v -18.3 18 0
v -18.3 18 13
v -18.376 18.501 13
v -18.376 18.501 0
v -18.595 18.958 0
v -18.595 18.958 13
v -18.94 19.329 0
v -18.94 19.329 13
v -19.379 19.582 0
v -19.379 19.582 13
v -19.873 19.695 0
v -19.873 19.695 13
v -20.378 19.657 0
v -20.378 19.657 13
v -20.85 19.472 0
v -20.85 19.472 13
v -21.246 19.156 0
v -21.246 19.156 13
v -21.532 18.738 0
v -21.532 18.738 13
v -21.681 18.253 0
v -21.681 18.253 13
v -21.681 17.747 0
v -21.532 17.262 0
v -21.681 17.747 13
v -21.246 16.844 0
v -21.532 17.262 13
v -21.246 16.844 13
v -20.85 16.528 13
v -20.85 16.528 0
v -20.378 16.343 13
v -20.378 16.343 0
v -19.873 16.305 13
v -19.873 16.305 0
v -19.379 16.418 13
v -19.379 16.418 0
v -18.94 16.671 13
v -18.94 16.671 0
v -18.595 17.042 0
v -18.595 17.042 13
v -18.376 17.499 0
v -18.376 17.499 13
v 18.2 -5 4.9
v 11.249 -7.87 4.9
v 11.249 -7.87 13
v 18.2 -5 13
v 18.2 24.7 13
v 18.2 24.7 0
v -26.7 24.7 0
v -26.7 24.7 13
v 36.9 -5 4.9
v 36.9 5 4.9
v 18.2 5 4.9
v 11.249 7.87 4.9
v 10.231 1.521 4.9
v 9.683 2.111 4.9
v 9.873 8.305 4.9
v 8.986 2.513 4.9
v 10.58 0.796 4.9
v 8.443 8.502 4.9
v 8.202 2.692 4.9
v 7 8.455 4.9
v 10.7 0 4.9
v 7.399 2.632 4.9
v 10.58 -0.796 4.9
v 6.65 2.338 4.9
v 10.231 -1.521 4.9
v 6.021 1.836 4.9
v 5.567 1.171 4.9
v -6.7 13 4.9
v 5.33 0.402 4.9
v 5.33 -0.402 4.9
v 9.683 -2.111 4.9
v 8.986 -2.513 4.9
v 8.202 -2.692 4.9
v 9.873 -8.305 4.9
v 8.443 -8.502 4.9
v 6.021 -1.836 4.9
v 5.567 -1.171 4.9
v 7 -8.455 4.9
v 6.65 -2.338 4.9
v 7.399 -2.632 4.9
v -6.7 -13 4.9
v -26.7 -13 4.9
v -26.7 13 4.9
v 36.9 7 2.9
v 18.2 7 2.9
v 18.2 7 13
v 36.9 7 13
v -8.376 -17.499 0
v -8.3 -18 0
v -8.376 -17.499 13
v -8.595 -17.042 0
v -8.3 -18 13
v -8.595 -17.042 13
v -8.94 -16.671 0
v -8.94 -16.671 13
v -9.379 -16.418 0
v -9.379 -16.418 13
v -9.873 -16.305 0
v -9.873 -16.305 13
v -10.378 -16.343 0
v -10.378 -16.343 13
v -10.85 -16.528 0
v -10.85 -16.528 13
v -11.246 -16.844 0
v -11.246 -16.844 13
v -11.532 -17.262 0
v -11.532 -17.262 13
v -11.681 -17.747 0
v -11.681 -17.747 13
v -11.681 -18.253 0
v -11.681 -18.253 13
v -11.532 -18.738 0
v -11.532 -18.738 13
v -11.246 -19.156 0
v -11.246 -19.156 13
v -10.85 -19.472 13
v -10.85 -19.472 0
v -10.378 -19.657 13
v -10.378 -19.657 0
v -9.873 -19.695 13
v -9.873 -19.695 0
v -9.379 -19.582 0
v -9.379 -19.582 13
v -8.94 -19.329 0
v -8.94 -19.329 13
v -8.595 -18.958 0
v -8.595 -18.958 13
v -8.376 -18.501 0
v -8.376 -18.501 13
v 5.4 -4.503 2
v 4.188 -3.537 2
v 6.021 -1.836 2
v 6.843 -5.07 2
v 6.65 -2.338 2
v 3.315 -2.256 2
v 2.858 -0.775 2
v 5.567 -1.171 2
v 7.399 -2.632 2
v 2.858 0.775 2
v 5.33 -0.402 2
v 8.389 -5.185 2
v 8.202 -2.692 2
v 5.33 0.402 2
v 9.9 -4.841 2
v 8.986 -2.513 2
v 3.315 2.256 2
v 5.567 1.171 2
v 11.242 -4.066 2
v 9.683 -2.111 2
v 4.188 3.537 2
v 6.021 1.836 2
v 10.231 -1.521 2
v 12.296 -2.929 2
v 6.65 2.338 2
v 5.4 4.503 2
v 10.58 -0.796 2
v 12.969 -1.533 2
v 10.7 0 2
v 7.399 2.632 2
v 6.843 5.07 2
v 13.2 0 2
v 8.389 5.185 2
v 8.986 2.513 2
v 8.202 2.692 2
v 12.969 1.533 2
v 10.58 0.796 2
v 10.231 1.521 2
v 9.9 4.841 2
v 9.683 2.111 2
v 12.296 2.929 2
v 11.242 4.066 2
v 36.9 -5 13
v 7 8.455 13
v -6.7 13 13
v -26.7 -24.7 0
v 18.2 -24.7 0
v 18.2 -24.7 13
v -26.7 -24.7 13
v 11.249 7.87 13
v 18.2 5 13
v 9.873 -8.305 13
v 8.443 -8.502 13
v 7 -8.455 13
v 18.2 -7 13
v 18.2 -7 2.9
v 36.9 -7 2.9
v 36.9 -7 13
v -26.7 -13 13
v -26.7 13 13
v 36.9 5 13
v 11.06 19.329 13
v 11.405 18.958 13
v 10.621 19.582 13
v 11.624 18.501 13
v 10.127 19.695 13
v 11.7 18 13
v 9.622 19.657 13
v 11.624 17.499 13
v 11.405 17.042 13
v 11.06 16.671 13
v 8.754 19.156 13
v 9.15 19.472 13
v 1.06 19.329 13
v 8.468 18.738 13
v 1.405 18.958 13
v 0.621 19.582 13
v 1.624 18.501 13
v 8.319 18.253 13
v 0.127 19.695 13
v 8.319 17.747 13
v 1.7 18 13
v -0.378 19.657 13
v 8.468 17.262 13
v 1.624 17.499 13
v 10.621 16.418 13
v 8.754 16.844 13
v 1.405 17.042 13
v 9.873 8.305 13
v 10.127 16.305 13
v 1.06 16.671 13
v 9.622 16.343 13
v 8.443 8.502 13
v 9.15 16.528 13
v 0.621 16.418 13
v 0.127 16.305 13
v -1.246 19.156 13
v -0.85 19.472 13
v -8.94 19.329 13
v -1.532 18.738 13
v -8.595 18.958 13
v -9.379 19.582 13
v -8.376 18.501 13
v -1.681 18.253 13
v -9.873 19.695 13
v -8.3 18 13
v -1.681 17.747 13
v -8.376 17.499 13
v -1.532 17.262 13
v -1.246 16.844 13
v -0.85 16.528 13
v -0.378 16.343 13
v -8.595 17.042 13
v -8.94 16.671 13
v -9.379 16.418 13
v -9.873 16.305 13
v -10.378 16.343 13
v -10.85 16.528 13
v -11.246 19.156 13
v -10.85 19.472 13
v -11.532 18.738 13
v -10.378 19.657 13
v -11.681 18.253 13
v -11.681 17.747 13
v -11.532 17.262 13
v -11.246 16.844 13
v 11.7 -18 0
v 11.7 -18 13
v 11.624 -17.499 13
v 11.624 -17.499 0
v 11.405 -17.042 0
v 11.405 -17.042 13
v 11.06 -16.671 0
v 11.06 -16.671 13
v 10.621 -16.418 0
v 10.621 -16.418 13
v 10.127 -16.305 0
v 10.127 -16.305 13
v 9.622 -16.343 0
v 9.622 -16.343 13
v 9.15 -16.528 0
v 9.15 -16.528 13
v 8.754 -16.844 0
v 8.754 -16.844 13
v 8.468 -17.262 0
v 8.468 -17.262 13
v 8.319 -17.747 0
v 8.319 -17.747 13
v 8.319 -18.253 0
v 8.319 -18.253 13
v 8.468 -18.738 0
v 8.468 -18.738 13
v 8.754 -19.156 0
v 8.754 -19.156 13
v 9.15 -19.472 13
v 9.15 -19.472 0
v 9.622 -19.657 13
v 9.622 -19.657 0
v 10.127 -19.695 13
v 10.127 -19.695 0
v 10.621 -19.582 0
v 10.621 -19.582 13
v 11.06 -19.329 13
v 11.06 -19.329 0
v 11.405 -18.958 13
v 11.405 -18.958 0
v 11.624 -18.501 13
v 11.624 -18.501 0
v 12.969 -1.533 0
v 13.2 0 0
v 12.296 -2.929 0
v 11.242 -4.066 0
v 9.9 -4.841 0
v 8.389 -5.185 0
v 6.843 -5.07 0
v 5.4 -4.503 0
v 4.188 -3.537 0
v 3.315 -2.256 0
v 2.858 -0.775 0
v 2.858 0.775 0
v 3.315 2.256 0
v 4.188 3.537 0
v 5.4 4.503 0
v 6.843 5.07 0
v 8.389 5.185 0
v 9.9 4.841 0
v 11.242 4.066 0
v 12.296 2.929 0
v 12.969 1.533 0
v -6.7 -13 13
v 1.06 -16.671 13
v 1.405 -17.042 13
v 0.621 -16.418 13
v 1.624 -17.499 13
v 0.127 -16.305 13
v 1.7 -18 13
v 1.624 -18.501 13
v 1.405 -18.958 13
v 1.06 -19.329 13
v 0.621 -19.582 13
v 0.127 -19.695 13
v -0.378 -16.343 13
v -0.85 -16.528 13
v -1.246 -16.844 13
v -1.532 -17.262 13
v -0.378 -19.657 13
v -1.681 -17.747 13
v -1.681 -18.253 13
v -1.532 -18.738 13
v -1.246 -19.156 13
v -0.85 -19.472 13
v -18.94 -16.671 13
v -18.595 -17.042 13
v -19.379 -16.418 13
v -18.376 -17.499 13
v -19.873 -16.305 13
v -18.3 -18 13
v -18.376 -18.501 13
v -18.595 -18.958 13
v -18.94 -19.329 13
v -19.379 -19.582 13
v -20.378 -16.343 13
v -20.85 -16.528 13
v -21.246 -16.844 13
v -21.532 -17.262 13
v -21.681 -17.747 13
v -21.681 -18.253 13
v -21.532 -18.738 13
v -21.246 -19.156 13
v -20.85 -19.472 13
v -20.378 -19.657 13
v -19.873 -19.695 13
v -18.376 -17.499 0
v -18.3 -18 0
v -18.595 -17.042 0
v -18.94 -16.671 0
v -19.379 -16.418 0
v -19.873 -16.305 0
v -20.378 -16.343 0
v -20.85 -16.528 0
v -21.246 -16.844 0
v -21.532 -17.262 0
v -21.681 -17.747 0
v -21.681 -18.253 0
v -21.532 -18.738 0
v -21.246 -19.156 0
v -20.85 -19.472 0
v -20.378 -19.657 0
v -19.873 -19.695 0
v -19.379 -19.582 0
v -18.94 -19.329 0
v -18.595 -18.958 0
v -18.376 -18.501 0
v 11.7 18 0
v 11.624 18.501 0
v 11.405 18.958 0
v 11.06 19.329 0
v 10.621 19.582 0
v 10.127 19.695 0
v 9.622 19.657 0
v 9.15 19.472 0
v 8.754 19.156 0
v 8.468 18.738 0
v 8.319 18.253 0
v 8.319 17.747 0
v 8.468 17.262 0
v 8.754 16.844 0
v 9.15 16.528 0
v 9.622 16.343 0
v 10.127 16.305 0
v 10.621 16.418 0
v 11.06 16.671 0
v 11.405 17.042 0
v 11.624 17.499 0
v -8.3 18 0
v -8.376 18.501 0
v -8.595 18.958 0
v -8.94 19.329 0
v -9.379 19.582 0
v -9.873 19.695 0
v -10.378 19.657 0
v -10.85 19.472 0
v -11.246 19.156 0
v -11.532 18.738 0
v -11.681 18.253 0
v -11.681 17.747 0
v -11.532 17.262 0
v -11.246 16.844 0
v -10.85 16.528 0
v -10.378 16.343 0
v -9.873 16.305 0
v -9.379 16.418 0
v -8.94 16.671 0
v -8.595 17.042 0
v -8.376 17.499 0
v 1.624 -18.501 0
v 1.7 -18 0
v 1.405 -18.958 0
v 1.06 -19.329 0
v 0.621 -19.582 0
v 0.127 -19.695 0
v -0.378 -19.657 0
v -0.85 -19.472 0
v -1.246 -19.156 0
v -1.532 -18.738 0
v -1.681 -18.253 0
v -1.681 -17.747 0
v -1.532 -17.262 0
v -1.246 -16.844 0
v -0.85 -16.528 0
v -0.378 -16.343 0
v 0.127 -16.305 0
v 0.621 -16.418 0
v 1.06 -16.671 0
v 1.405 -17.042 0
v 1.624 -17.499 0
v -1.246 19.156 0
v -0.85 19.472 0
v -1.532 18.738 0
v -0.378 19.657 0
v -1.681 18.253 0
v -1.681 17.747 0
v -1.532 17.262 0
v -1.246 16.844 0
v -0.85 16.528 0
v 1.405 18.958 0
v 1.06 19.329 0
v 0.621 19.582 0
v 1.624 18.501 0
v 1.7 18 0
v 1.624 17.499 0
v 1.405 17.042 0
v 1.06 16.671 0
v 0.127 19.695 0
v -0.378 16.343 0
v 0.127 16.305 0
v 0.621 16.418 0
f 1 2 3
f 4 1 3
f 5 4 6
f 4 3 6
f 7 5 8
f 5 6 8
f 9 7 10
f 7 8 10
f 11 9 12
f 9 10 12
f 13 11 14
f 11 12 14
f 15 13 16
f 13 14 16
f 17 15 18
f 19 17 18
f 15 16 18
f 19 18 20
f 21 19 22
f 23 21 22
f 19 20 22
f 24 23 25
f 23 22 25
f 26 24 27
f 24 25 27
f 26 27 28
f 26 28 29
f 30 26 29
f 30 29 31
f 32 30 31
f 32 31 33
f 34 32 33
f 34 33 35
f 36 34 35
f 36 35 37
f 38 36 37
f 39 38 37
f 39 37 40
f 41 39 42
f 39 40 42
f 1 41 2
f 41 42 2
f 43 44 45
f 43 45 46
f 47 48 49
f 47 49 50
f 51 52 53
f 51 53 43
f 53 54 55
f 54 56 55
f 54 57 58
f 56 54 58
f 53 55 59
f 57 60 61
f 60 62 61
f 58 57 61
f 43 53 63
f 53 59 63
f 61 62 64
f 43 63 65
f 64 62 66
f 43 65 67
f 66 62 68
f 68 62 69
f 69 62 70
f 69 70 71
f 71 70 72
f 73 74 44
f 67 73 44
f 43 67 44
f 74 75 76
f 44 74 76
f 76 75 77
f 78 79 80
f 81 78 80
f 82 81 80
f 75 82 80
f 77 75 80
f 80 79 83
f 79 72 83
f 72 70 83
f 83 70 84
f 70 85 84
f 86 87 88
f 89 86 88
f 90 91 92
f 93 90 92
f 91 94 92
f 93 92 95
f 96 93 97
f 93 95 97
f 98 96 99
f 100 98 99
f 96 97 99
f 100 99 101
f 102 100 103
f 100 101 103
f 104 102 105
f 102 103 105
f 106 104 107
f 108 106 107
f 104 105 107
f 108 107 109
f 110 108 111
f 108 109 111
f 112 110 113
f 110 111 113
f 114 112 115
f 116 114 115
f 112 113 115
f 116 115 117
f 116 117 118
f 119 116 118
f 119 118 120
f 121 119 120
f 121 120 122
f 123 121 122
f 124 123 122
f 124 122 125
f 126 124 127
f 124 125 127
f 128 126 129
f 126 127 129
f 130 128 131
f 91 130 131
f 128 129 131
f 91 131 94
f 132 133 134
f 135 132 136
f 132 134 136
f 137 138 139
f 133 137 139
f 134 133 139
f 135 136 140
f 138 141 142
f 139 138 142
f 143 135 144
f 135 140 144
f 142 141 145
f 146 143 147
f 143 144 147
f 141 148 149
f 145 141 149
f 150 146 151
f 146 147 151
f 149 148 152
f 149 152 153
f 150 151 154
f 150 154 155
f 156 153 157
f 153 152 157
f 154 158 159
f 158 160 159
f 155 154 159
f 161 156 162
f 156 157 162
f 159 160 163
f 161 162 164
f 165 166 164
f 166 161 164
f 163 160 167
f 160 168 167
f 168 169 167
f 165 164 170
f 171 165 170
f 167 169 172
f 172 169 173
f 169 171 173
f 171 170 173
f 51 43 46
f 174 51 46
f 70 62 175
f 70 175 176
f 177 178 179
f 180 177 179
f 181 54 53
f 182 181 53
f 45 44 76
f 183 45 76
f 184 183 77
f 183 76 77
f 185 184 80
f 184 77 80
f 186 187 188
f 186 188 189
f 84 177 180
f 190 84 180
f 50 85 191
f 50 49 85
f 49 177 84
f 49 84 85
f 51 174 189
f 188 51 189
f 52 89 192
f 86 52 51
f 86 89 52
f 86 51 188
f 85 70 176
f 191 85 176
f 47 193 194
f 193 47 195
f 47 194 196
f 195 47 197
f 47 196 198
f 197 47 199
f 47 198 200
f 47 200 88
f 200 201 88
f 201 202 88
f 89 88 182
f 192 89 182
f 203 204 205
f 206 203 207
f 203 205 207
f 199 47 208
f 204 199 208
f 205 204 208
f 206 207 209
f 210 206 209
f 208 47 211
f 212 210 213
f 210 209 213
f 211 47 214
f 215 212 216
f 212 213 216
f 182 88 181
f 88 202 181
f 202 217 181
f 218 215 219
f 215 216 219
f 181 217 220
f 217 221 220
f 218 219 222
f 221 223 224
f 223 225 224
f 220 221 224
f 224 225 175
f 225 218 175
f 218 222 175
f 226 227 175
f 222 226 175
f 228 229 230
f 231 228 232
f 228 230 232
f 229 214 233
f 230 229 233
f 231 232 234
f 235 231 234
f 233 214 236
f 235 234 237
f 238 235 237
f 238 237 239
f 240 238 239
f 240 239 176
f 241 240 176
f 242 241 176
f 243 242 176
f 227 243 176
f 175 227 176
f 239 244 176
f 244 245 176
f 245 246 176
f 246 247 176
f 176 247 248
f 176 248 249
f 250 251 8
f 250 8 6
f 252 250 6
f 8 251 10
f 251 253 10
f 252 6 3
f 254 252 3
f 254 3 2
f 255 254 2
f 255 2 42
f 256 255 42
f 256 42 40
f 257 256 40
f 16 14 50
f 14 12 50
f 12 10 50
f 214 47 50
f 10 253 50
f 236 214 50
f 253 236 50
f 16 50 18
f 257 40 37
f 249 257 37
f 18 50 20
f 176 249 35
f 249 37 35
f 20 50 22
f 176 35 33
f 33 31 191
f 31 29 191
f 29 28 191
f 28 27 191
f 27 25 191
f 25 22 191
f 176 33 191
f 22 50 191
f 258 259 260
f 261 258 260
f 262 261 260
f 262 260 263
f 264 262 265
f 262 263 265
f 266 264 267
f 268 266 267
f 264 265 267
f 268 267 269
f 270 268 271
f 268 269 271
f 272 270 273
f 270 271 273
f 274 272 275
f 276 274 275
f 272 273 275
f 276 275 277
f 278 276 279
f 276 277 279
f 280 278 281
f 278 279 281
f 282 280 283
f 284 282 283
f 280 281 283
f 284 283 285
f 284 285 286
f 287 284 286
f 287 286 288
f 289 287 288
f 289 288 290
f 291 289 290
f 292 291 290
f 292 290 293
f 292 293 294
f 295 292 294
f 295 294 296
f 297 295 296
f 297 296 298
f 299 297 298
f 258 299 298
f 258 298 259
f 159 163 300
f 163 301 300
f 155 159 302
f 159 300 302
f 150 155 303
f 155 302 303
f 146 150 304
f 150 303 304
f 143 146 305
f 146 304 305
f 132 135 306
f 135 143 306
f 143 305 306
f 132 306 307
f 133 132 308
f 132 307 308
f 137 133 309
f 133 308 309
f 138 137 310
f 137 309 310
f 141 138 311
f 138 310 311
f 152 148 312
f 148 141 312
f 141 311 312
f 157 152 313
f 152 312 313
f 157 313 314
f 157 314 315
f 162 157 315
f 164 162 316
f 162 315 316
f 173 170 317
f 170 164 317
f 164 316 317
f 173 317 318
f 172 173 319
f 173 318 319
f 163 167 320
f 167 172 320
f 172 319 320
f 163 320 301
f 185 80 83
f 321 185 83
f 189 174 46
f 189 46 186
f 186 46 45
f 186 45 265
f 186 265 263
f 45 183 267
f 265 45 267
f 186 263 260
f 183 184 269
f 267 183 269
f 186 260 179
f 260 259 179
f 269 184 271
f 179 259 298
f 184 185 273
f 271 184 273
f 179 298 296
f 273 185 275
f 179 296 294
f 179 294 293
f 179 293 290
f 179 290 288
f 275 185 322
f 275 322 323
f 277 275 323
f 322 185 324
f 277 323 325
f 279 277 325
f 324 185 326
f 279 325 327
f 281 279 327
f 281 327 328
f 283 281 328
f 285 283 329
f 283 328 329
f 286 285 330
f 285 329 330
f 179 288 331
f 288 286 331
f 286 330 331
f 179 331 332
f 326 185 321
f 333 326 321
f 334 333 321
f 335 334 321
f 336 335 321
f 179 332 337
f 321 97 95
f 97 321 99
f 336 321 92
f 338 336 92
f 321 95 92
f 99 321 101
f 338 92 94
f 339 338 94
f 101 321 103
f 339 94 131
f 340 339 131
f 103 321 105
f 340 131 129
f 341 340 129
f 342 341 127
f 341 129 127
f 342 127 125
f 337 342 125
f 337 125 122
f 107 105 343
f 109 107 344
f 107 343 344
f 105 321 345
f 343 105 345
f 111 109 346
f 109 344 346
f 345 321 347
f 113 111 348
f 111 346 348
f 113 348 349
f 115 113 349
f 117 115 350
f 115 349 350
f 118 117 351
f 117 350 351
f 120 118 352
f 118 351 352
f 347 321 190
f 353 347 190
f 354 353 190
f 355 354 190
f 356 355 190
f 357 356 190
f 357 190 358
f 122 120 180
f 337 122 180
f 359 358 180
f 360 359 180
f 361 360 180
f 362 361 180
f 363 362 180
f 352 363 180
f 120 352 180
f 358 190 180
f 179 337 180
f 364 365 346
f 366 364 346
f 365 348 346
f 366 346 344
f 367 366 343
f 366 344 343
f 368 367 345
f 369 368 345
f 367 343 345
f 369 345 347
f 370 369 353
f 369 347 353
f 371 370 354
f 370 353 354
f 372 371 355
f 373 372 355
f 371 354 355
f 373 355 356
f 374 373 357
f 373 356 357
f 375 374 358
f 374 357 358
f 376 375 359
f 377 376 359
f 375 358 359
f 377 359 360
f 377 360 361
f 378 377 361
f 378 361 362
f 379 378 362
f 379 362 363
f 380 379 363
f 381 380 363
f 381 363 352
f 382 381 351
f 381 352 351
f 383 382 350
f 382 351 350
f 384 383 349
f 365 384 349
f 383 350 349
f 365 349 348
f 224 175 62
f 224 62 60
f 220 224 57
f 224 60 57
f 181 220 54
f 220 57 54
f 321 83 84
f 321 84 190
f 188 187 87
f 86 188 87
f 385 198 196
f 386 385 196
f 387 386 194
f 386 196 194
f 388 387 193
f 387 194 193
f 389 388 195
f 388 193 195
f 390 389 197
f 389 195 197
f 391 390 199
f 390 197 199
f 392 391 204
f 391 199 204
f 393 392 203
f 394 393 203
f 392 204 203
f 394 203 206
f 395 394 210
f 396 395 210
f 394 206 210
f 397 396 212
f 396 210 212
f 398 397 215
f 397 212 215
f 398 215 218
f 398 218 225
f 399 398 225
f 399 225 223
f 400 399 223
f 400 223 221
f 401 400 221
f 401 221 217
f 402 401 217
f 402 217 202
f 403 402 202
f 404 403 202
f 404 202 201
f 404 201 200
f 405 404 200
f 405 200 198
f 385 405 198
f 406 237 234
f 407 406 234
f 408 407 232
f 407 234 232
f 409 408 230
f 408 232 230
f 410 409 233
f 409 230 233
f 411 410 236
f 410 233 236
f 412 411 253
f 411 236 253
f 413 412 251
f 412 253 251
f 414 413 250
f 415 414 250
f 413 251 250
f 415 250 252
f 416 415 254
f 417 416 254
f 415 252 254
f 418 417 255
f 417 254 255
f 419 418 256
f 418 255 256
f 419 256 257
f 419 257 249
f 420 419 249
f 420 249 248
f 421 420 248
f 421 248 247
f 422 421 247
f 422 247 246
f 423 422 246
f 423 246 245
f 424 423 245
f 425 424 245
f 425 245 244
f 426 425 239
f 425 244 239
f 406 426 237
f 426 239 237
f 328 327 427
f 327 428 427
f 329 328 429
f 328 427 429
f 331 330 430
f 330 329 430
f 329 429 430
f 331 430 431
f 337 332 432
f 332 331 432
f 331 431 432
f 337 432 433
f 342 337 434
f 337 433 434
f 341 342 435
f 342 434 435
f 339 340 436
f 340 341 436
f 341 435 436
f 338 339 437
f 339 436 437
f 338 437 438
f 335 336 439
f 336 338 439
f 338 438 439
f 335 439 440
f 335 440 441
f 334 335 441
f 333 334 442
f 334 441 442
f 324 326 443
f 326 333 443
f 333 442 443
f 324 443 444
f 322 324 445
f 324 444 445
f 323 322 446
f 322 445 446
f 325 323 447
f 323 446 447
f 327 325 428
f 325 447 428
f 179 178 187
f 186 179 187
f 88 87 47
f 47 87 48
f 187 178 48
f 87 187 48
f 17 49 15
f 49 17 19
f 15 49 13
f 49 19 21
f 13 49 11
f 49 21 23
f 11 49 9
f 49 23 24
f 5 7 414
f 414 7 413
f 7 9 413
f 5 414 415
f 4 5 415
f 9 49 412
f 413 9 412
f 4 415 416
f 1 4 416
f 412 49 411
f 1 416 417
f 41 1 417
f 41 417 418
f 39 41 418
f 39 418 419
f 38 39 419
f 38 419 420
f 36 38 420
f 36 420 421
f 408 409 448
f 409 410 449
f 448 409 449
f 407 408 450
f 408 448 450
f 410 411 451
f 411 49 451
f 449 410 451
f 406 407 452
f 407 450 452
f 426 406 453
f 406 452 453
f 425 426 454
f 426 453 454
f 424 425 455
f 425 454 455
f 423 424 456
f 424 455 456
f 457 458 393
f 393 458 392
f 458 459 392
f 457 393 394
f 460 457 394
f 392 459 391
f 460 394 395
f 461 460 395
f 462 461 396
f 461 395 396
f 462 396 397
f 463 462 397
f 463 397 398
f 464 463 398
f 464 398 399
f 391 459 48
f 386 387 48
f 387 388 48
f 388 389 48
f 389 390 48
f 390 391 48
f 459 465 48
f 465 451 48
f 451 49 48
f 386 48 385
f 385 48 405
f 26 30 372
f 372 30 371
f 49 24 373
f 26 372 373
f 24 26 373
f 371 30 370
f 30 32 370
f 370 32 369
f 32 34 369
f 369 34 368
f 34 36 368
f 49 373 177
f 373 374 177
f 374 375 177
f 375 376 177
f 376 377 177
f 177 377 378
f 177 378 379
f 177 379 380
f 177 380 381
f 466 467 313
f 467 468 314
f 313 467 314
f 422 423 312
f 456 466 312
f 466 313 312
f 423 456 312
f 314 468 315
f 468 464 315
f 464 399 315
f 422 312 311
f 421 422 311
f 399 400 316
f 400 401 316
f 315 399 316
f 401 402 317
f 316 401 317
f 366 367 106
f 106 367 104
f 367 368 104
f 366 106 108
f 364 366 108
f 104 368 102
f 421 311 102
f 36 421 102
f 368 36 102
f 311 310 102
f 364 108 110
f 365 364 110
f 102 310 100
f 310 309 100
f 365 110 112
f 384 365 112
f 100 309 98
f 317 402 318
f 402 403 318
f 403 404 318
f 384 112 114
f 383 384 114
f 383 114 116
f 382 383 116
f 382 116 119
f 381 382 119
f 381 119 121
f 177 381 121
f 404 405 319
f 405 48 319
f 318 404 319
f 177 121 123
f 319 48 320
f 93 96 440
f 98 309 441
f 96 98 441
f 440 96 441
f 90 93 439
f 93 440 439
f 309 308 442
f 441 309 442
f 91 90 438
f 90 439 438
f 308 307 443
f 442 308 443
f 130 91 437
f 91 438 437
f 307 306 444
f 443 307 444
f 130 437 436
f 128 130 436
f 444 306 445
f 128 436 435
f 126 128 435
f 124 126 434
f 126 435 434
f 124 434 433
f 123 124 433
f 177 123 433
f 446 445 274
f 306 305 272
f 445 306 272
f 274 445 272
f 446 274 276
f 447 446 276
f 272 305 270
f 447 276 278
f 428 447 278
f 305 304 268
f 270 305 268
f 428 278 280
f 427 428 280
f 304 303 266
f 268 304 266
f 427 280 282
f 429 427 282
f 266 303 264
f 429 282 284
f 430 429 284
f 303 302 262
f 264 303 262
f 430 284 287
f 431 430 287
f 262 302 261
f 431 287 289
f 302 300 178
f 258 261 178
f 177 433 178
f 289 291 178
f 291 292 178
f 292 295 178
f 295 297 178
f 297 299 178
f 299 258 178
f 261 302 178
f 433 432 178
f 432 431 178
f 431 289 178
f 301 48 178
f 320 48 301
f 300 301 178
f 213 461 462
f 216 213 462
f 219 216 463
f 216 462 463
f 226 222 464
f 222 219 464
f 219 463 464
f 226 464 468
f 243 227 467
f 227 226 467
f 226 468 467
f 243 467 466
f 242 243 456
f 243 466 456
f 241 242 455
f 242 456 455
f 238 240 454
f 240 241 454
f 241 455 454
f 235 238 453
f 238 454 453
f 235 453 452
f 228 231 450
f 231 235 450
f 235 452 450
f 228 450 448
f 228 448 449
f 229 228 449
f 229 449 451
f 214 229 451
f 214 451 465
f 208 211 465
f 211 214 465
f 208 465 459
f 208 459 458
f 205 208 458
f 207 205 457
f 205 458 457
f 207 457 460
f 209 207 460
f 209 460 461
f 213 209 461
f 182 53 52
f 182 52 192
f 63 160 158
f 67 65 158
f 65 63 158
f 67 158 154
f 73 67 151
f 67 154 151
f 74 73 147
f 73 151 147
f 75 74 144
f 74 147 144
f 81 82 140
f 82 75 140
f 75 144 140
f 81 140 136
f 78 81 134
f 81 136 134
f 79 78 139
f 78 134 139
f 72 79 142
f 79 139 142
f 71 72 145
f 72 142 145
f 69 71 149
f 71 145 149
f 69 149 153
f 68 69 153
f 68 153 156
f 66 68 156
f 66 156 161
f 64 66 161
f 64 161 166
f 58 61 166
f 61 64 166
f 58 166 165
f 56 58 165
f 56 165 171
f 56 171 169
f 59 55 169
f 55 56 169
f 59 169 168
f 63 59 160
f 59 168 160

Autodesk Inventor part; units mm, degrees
ref_plane "Work Plane1" through (0, 0, 0) normal (0, 0, 1) x (1, 0, 0)
sketch "Sketch1" plane through (0, 0, 0) normal (0, 0, 1) x (1, 0, 0)
  circle A0 centre (8, 0) radius 5 construction
  circle A1 centre (0, 18) radius 2 construction
  circle A2 centre (0, -18) radius 2 construction
  arc A3 (-10.2835, -9.5) -> (-3, -13.6748) centre (0, 0) ccw construction
  line L0 (-3, -13.6748) -> (-3, -18) construction
  arc A4 (-3, -18) -> (3, -18) centre (0, -18) ccw construction
  line L1 (3, -18) -> (3, -13.6748) construction
  arc A5 (3, -13.6748) -> (3, 13.6748) centre (0, 0) ccw construction
  line L2 (3, 13.6748) -> (3, 18) construction
  arc A6 (3, 18) -> (-3, 18) centre (0, 18) ccw construction
  line L3 (-3, 18) -> (-3, 13.6748) construction
  arc A7 (-3, 13.6748) -> (-10.2835, 9.5) centre (0, 0) ccw construction
  line L4 (-10.2835, 9.5) -> (-15.2835, 9.5) construction
  line L5 (-15.2835, 9.5) -> (-15.2835, -9.5) construction
  line L6 (-15.2835, -9.5) -> (-10.2835, -9.5) construction
  circle A8 centre (8, 0) radius 5.2
  circle A9 centre (0, -18) radius 1.7
  circle A10 centre (0, 18) radius 1.7
  line L7 (8, 0) -> (0, 0) construction
  line L8 (8, 0) -> (0, 0)
  line L9 (18.2, 24.7) -> (-6.7, 24.7)
  line L10 (-6.7, 24.7) -> (-6.7, -24.7)
  line L11 (-6.7, -24.7) -> (18.2, -24.7)
  line L12 (18.2, -24.7) -> (18.2, 24.7)
  point P0 (13.2, 0)
  point P1 (-1.7, 18)
  point P2 (0, 19.7)
  dimension "d0" = 0.2
  dimension "d3" = 5
  dimension "d4" = 5
  dimension "d5" = 5
  dimension "d20" = 3.4
ref_plane "Work Plane2" through (3, -5, 1.9) normal (0, 0, 1) x (1, 0, 0)
ref_plane "Work Plane3" through (8, 0, 2) normal (0, 0, 1) x (1, 0, 0)
extrude "Extrusion1" add sketch "Sketch1" along normal up to surface (2 mm away)
sketch "Sketch2" plane through (-6.7, 24.7, 2) normal (0, 0, 1) x (1, 0, 0)
  circle A0 centre (6.7, -6.7) radius 1.7 projected
  circle A1 centre (6.7, -42.7) radius 1.7 projected
  circle A2 centre (14.7, -24.7) radius 5.2 construction
  line L0 (0, 0) -> (24.9, 0) projected
  line L1 (0, -49.4) -> (0, 0) projected
  line L2 (24.9, -49.4) -> (0, -49.4) projected
  line L3 (24.9, 0) -> (24.9, -49.4) projected
  circle A3 centre (14.7, -24.7) radius 2.5 construction
  circle A4 centre (14.7, -24.7) radius 2.7
  point P0 (6.7, -24.7)
  dimension "d8" = 0.2
ref_plane "Work Plane4" through (9.5, -2, 4.9) normal (0, 0, 1) x (1, 0, 0)
extrude "Extrusion2" add sketch "Sketch2" along normal up to surface (2.9 mm away)
sketch "Sketch3" plane through (-6.7, -24.7, 4.9) normal (0, 0, 1) x (1, 0, 0)
  arc A0 (18.0541, 25.7) -> (15.7, 28.0541) centre (14.7, 24.7) ccw construction
  line L0 (15.7, 33.0541) -> (15.7, 28.0541) construction
  line L1 (13.7, 33.0541) -> (15.7, 33.0541) construction
  line L2 (13.7, 28.0541) -> (13.7, 33.0541) construction
  arc A1 (13.7, 28.0541) -> (11.3459, 25.7) centre (14.7, 24.7) ccw construction
  line L3 (6.3459, 25.7) -> (11.3459, 25.7) construction
  line L4 (6.3459, 23.7) -> (6.3459, 25.7) construction
  line L5 (11.3459, 23.7) -> (6.3459, 23.7) construction
  arc A2 (11.3459, 23.7) -> (13.7, 21.3459) centre (14.7, 24.7) ccw construction
  line L6 (13.7, 16.3459) -> (13.7, 21.3459) construction
  line L7 (15.7, 16.3459) -> (13.7, 16.3459) construction
  line L8 (15.7, 21.3459) -> (15.7, 16.3459) construction
  arc A3 (15.7, 21.3459) -> (18.0541, 23.7) centre (14.7, 24.7) ccw construction
  line L9 (23.0541, 23.7) -> (18.0541, 23.7) construction
  line L10 (23.0541, 25.7) -> (23.0541, 23.7) construction
  line L11 (18.0541, 25.7) -> (23.0541, 25.7) construction
  circle A4 centre (14.7, 24.7) radius 8.4137 construction
  arc A5 (17.9486, 32.5696) -> (17.9486, 16.8304) centre (14.7, 24.7) ccw
  circle A6 centre (6.7, 42.7) radius 1.7 projected
  circle A7 centre (6.7, 6.7) radius 1.7 projected
  circle A8 centre (14.7, 24.7) radius 2.7 projected
  line L12 (0, 0) -> (0, 49.4) projected
  line L13 (24.9, 0) -> (0, 0) projected
  line L14 (24.9, 49.4) -> (24.9, 0) projected
  line L15 (0, 49.4) -> (24.9, 49.4) projected
  line L16 (0, 49.4) -> (0, 0) projected
  circle A9 centre (14.7, 24.7) radius 2.7 projected
  line L17 (14.7, 24.7) -> (0, 24.7) construction
  line L18 (17.9486, 16.8304) -> (24.9, 19.7)
  line L19 (24.9, 0) -> (24.9, 49.4) projected
  line L20 (17.9486, 32.5696) -> (24.9, 29.7)
  line L21 (13.7, 16.2452) -> (0, 11.7)
  line L22 (13.7, 33.1548) -> (0, 37.7)
  point P0 (6.7, 24.7)
  point P1 (0, 37.7)
  point P2 (24.9, 19.7)
  point P3 (0, 11.7)
  point P4 (0, 37.7)
  dimension "d11" = 0.1
  dimension "d13" = 10
  dimension "d17" = 5
ref_plane "Work Plane5" through (8, 0, 13.1) normal (0, 0, 1) x (-1, 0, 0)
ref_plane "Work Plane6" through (-0.3541, -8.3541, 13) normal (0, 0, 1) x (1, 0, 0)
extrude "Extrusion3" add sketch "Sketch3" along normal up to surface (8.1 mm away) contours A5 L22 L12 L15 L14 L20 | A5 L18 L14 L13 L12 L21
sketch "Sketch4" plane through (-6.7, -24.7, 0) normal (-1, 0, 0) x (0, 0, 1)
  line L0 (0, 49.4) -> (13, 49.4) projected
  line L1 (0, 49.4) -> (0, 0) projected
  line L2 (0, 0) -> (13, 0) projected
  line L3 (13, 0) -> (13, 11.7) projected
  line L4 (4.9, 11.7) -> (13, 11.7) projected
  line L5 (4.9, 11.7) -> (4.9, 37.7) projected
  line L6 (4.9, 37.7) -> (13, 37.7) projected
  line L7 (13, 37.7) -> (13, 49.4) projected
  point P0 (0, 24.7)
extrude "Extrusion4" add sketch "Sketch4" along normal blind 20
sketch "Sketch5" plane through (18.2, -24.7, 13) normal (0, 0, 1) x (1, 0, 0)
  circle A0 centre (-18.2, 6.7) radius 1.7 projected
  circle A1 centre (-18.2, 6.7) radius 1.7
  line L0 (0, 0) -> (-44.9, 0) projected
  circle A2 centre (-28.2, 6.7) radius 1.7
  circle A3 centre (-38.2, 6.7) radius 1.7
  circle A4 centre (-8.2, 6.7) radius 1.7
  circle A5 centre (-18.2, 6.7) radius 1.7
  circle A6 centre (-28.2, 6.7) radius 1.7
  point P0 (-18.2, 24.7)
  dimension "d23" = 10
  dimension "d26" = 10
extrude "Extrusion5" cut sketch "Sketch5" against normal through all contours A2 | A3 | A4
mirror "Mirror1" about plane through (0, 0, 0) normal (0, 1, 0) of "Extrusion5"
sketch "Sketch6" plane through (18.2, -24.7, 0) normal (1, 0, 0) x (0, 0, -1)
  line L0 (0, 0) -> (-13, 0) projected
  line L1 (0, 0) -> (0, 49.4) projected
  line L2 (0, 49.4) -> (-13, 49.4) projected
  line L3 (-13, 49.4) -> (-13, 29.7) projected
  line L4 (-4.9, 29.7) -> (-13, 29.7) projected
  line L5 (-4.9, 29.7) -> (-4.9, 19.7) projected
  line L6 (-4.9, 19.7) -> (-13, 19.7) projected
  line L7 (-13, 19.7) -> (-13, 0) projected
  line L8 (-11, 31.7) -> (-11, 47.4)
  line L9 (-11, 47.4) -> (-2, 47.4)
  line L10 (-2, 47.4) -> (-2, 2)
  line L11 (-2, 2) -> (-11, 2)
  line L12 (-11, 2) -> (-11, 17.7)
  line L13 (-11, 17.7) -> (-2.9, 17.7)
  line L14 (-2.9, 17.7) -> (-2.9, 31.7)
  line L15 (-2.9, 31.7) -> (-11, 31.7)
  line L16 (-11, 31.7) -> (-13, 31.7)
  line L17 (-13, 49.4) -> (-13, 29.7) projected
  line L18 (-11, 17.7) -> (-13, 17.7)
  point P0 (0, 24.7)
  point P1 (-13, 31.7)
  dimension "d31" = 2
ref_plane "Work Plane7" through (36.9, -26.2379, 21.2621) normal (1, 0, 0) x (0, 0.9775, 0.2109)
extrude "Extrusion6" add sketch "Sketch6" along normal up to surface (18.7 mm away) contours L7 L6 L5 L4 L3 L16 L15 L14 L13 L18
